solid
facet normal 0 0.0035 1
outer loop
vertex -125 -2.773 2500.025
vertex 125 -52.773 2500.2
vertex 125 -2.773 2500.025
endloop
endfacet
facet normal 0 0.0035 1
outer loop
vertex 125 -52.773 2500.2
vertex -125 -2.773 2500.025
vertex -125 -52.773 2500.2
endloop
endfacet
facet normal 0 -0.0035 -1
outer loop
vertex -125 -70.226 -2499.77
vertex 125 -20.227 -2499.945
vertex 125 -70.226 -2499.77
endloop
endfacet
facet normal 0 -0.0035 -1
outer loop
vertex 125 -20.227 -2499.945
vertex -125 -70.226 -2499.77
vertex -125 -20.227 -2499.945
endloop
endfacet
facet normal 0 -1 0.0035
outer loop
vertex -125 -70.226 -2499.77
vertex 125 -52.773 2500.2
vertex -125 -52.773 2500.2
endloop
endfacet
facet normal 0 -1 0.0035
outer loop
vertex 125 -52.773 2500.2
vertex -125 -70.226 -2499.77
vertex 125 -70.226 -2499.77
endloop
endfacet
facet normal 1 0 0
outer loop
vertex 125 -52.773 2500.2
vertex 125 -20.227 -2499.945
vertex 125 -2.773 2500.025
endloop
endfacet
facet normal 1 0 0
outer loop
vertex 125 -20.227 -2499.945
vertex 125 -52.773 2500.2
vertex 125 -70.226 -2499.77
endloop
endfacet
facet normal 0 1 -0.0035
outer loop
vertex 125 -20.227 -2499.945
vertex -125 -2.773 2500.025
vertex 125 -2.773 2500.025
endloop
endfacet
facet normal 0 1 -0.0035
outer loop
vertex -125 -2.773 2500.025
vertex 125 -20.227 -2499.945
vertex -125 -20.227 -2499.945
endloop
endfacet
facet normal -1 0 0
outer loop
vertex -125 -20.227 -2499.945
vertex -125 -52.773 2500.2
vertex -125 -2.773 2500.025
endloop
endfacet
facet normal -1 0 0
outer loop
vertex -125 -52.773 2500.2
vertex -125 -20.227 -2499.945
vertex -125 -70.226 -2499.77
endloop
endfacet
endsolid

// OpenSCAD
multmatrix( m=[[1,0,0,0],
[0,0.999994,0.00349065,-36.4998],
[0,-0.00349065,0.999994,0.127409],
[0,0,0,1]]){cube([250,50,5000],true);}
